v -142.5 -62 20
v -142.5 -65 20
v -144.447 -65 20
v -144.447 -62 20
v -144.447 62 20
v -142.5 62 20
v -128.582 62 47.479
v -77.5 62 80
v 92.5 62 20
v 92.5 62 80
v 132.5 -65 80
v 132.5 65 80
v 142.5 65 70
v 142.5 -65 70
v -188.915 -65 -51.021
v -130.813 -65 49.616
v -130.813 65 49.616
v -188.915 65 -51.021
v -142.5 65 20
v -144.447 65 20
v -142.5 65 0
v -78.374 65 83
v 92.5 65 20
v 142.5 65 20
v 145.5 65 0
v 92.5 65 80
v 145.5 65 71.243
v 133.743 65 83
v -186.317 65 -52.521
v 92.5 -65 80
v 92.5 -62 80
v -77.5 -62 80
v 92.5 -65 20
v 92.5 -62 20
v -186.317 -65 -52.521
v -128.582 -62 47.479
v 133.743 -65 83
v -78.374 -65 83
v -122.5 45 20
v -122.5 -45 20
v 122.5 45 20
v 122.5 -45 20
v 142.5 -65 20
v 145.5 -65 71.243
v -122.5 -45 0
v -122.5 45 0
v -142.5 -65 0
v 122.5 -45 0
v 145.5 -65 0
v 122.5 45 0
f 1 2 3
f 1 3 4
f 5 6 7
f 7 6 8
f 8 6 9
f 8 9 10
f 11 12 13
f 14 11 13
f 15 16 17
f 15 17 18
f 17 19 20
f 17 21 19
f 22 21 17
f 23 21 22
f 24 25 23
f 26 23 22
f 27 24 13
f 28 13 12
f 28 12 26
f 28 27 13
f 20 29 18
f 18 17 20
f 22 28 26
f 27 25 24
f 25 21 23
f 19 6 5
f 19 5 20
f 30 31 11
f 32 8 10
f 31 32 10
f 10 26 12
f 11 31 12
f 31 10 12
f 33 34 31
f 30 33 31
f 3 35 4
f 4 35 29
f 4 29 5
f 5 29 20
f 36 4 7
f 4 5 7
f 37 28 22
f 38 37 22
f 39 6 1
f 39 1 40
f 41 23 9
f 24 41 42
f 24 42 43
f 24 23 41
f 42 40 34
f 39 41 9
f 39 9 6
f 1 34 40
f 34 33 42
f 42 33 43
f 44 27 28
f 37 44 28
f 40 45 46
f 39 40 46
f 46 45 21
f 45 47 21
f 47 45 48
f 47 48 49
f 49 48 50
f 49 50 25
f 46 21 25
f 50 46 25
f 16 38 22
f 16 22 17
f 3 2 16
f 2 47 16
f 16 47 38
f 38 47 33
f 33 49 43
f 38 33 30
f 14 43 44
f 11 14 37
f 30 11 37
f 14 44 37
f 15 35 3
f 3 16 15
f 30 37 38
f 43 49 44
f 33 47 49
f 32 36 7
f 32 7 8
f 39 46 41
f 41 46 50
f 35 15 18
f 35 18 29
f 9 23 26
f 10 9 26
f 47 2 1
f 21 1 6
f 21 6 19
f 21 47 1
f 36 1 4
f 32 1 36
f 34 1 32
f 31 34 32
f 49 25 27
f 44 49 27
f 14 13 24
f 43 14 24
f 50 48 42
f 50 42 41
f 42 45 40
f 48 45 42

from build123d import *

# Parameters (mm, degrees)
SKETCH1_W           = 285
SKETCH1_H           = 130
SKETCH1_W_2         = 245
SKETCH1_H_2         = 90
BOSS_EXTRUDE1_DEPTH = 20
EXTRUDE_THIN1_DEPTH = 130
BOSS_EXTRUDE2_REACH = 399.778
BOSS_EXTRUDE2_START = 50
SKETCH3_W           = 60
SKETCH3_H           = 3


with BuildPart() as part:
    # Sketch1 → Boss-Extrude1 (new body)
    with BuildSketch(Plane.XY):
        Rectangle(SKETCH1_W, SKETCH1_H)
        Rectangle(SKETCH1_W_2, SKETCH1_H_2, mode=Mode.SUBTRACT)
    extrude(amount=BOSS_EXTRUDE1_DEPTH)

    # Sketch2 → Extrude-Thin1 (add, through all)
    with BuildSketch(Plane(origin=(0, 65, 0), x_dir=(1, 0, 0), z_dir=(0, 1, 0))):
        Polygon((-186.31677691, 52.520571585), (-128.581749991, -47.479428415), (-77.5, -80), (132.5, -80), (142.5, -70), (142.5, 0), (145.5, 0), (145.5, -71.242640687), (133.742640687, -83), (-78.373919532, -83), (-130.812533941, -49.615597272), (-188.914853122, 51.020571585), align=None)
    extrude(amount=-EXTRUDE_THIN1_DEPTH)

    # Sketch3 → Boss-Extrude2 (add, up to next)
    with BuildSketch(Plane.ZY.offset(-142.5).offset(BOSS_EXTRUDE2_START), mode=Mode.PRIVATE) as boss_extrude2_sk1:
        with Locations((50, -63.5)):
            Rectangle(SKETCH3_W, SKETCH3_H)
    boss_extrude2_tool1 = extrude(boss_extrude2_sk1.sketch, amount=BOSS_EXTRUDE2_REACH, mode=Mode.PRIVATE) - part.part
    # Sketch3 → Boss-Extrude2 (add, up to next)
    with BuildSketch(Plane.ZY.offset(-142.5).offset(BOSS_EXTRUDE2_START), mode=Mode.PRIVATE) as boss_extrude2_sk2:
        with Locations((50, 63.5)):
            Rectangle(SKETCH3_W, SKETCH3_H)
    boss_extrude2_tool2 = extrude(boss_extrude2_sk2.sketch, amount=BOSS_EXTRUDE2_REACH, mode=Mode.PRIVATE) - part.part
    add(boss_extrude2_tool1.solids().sort_by_distance((92.5, -63.5, 50))[0])
    add(boss_extrude2_tool2.solids().sort_by_distance((92.5, 63.5, 50))[0])


solid = part.part
